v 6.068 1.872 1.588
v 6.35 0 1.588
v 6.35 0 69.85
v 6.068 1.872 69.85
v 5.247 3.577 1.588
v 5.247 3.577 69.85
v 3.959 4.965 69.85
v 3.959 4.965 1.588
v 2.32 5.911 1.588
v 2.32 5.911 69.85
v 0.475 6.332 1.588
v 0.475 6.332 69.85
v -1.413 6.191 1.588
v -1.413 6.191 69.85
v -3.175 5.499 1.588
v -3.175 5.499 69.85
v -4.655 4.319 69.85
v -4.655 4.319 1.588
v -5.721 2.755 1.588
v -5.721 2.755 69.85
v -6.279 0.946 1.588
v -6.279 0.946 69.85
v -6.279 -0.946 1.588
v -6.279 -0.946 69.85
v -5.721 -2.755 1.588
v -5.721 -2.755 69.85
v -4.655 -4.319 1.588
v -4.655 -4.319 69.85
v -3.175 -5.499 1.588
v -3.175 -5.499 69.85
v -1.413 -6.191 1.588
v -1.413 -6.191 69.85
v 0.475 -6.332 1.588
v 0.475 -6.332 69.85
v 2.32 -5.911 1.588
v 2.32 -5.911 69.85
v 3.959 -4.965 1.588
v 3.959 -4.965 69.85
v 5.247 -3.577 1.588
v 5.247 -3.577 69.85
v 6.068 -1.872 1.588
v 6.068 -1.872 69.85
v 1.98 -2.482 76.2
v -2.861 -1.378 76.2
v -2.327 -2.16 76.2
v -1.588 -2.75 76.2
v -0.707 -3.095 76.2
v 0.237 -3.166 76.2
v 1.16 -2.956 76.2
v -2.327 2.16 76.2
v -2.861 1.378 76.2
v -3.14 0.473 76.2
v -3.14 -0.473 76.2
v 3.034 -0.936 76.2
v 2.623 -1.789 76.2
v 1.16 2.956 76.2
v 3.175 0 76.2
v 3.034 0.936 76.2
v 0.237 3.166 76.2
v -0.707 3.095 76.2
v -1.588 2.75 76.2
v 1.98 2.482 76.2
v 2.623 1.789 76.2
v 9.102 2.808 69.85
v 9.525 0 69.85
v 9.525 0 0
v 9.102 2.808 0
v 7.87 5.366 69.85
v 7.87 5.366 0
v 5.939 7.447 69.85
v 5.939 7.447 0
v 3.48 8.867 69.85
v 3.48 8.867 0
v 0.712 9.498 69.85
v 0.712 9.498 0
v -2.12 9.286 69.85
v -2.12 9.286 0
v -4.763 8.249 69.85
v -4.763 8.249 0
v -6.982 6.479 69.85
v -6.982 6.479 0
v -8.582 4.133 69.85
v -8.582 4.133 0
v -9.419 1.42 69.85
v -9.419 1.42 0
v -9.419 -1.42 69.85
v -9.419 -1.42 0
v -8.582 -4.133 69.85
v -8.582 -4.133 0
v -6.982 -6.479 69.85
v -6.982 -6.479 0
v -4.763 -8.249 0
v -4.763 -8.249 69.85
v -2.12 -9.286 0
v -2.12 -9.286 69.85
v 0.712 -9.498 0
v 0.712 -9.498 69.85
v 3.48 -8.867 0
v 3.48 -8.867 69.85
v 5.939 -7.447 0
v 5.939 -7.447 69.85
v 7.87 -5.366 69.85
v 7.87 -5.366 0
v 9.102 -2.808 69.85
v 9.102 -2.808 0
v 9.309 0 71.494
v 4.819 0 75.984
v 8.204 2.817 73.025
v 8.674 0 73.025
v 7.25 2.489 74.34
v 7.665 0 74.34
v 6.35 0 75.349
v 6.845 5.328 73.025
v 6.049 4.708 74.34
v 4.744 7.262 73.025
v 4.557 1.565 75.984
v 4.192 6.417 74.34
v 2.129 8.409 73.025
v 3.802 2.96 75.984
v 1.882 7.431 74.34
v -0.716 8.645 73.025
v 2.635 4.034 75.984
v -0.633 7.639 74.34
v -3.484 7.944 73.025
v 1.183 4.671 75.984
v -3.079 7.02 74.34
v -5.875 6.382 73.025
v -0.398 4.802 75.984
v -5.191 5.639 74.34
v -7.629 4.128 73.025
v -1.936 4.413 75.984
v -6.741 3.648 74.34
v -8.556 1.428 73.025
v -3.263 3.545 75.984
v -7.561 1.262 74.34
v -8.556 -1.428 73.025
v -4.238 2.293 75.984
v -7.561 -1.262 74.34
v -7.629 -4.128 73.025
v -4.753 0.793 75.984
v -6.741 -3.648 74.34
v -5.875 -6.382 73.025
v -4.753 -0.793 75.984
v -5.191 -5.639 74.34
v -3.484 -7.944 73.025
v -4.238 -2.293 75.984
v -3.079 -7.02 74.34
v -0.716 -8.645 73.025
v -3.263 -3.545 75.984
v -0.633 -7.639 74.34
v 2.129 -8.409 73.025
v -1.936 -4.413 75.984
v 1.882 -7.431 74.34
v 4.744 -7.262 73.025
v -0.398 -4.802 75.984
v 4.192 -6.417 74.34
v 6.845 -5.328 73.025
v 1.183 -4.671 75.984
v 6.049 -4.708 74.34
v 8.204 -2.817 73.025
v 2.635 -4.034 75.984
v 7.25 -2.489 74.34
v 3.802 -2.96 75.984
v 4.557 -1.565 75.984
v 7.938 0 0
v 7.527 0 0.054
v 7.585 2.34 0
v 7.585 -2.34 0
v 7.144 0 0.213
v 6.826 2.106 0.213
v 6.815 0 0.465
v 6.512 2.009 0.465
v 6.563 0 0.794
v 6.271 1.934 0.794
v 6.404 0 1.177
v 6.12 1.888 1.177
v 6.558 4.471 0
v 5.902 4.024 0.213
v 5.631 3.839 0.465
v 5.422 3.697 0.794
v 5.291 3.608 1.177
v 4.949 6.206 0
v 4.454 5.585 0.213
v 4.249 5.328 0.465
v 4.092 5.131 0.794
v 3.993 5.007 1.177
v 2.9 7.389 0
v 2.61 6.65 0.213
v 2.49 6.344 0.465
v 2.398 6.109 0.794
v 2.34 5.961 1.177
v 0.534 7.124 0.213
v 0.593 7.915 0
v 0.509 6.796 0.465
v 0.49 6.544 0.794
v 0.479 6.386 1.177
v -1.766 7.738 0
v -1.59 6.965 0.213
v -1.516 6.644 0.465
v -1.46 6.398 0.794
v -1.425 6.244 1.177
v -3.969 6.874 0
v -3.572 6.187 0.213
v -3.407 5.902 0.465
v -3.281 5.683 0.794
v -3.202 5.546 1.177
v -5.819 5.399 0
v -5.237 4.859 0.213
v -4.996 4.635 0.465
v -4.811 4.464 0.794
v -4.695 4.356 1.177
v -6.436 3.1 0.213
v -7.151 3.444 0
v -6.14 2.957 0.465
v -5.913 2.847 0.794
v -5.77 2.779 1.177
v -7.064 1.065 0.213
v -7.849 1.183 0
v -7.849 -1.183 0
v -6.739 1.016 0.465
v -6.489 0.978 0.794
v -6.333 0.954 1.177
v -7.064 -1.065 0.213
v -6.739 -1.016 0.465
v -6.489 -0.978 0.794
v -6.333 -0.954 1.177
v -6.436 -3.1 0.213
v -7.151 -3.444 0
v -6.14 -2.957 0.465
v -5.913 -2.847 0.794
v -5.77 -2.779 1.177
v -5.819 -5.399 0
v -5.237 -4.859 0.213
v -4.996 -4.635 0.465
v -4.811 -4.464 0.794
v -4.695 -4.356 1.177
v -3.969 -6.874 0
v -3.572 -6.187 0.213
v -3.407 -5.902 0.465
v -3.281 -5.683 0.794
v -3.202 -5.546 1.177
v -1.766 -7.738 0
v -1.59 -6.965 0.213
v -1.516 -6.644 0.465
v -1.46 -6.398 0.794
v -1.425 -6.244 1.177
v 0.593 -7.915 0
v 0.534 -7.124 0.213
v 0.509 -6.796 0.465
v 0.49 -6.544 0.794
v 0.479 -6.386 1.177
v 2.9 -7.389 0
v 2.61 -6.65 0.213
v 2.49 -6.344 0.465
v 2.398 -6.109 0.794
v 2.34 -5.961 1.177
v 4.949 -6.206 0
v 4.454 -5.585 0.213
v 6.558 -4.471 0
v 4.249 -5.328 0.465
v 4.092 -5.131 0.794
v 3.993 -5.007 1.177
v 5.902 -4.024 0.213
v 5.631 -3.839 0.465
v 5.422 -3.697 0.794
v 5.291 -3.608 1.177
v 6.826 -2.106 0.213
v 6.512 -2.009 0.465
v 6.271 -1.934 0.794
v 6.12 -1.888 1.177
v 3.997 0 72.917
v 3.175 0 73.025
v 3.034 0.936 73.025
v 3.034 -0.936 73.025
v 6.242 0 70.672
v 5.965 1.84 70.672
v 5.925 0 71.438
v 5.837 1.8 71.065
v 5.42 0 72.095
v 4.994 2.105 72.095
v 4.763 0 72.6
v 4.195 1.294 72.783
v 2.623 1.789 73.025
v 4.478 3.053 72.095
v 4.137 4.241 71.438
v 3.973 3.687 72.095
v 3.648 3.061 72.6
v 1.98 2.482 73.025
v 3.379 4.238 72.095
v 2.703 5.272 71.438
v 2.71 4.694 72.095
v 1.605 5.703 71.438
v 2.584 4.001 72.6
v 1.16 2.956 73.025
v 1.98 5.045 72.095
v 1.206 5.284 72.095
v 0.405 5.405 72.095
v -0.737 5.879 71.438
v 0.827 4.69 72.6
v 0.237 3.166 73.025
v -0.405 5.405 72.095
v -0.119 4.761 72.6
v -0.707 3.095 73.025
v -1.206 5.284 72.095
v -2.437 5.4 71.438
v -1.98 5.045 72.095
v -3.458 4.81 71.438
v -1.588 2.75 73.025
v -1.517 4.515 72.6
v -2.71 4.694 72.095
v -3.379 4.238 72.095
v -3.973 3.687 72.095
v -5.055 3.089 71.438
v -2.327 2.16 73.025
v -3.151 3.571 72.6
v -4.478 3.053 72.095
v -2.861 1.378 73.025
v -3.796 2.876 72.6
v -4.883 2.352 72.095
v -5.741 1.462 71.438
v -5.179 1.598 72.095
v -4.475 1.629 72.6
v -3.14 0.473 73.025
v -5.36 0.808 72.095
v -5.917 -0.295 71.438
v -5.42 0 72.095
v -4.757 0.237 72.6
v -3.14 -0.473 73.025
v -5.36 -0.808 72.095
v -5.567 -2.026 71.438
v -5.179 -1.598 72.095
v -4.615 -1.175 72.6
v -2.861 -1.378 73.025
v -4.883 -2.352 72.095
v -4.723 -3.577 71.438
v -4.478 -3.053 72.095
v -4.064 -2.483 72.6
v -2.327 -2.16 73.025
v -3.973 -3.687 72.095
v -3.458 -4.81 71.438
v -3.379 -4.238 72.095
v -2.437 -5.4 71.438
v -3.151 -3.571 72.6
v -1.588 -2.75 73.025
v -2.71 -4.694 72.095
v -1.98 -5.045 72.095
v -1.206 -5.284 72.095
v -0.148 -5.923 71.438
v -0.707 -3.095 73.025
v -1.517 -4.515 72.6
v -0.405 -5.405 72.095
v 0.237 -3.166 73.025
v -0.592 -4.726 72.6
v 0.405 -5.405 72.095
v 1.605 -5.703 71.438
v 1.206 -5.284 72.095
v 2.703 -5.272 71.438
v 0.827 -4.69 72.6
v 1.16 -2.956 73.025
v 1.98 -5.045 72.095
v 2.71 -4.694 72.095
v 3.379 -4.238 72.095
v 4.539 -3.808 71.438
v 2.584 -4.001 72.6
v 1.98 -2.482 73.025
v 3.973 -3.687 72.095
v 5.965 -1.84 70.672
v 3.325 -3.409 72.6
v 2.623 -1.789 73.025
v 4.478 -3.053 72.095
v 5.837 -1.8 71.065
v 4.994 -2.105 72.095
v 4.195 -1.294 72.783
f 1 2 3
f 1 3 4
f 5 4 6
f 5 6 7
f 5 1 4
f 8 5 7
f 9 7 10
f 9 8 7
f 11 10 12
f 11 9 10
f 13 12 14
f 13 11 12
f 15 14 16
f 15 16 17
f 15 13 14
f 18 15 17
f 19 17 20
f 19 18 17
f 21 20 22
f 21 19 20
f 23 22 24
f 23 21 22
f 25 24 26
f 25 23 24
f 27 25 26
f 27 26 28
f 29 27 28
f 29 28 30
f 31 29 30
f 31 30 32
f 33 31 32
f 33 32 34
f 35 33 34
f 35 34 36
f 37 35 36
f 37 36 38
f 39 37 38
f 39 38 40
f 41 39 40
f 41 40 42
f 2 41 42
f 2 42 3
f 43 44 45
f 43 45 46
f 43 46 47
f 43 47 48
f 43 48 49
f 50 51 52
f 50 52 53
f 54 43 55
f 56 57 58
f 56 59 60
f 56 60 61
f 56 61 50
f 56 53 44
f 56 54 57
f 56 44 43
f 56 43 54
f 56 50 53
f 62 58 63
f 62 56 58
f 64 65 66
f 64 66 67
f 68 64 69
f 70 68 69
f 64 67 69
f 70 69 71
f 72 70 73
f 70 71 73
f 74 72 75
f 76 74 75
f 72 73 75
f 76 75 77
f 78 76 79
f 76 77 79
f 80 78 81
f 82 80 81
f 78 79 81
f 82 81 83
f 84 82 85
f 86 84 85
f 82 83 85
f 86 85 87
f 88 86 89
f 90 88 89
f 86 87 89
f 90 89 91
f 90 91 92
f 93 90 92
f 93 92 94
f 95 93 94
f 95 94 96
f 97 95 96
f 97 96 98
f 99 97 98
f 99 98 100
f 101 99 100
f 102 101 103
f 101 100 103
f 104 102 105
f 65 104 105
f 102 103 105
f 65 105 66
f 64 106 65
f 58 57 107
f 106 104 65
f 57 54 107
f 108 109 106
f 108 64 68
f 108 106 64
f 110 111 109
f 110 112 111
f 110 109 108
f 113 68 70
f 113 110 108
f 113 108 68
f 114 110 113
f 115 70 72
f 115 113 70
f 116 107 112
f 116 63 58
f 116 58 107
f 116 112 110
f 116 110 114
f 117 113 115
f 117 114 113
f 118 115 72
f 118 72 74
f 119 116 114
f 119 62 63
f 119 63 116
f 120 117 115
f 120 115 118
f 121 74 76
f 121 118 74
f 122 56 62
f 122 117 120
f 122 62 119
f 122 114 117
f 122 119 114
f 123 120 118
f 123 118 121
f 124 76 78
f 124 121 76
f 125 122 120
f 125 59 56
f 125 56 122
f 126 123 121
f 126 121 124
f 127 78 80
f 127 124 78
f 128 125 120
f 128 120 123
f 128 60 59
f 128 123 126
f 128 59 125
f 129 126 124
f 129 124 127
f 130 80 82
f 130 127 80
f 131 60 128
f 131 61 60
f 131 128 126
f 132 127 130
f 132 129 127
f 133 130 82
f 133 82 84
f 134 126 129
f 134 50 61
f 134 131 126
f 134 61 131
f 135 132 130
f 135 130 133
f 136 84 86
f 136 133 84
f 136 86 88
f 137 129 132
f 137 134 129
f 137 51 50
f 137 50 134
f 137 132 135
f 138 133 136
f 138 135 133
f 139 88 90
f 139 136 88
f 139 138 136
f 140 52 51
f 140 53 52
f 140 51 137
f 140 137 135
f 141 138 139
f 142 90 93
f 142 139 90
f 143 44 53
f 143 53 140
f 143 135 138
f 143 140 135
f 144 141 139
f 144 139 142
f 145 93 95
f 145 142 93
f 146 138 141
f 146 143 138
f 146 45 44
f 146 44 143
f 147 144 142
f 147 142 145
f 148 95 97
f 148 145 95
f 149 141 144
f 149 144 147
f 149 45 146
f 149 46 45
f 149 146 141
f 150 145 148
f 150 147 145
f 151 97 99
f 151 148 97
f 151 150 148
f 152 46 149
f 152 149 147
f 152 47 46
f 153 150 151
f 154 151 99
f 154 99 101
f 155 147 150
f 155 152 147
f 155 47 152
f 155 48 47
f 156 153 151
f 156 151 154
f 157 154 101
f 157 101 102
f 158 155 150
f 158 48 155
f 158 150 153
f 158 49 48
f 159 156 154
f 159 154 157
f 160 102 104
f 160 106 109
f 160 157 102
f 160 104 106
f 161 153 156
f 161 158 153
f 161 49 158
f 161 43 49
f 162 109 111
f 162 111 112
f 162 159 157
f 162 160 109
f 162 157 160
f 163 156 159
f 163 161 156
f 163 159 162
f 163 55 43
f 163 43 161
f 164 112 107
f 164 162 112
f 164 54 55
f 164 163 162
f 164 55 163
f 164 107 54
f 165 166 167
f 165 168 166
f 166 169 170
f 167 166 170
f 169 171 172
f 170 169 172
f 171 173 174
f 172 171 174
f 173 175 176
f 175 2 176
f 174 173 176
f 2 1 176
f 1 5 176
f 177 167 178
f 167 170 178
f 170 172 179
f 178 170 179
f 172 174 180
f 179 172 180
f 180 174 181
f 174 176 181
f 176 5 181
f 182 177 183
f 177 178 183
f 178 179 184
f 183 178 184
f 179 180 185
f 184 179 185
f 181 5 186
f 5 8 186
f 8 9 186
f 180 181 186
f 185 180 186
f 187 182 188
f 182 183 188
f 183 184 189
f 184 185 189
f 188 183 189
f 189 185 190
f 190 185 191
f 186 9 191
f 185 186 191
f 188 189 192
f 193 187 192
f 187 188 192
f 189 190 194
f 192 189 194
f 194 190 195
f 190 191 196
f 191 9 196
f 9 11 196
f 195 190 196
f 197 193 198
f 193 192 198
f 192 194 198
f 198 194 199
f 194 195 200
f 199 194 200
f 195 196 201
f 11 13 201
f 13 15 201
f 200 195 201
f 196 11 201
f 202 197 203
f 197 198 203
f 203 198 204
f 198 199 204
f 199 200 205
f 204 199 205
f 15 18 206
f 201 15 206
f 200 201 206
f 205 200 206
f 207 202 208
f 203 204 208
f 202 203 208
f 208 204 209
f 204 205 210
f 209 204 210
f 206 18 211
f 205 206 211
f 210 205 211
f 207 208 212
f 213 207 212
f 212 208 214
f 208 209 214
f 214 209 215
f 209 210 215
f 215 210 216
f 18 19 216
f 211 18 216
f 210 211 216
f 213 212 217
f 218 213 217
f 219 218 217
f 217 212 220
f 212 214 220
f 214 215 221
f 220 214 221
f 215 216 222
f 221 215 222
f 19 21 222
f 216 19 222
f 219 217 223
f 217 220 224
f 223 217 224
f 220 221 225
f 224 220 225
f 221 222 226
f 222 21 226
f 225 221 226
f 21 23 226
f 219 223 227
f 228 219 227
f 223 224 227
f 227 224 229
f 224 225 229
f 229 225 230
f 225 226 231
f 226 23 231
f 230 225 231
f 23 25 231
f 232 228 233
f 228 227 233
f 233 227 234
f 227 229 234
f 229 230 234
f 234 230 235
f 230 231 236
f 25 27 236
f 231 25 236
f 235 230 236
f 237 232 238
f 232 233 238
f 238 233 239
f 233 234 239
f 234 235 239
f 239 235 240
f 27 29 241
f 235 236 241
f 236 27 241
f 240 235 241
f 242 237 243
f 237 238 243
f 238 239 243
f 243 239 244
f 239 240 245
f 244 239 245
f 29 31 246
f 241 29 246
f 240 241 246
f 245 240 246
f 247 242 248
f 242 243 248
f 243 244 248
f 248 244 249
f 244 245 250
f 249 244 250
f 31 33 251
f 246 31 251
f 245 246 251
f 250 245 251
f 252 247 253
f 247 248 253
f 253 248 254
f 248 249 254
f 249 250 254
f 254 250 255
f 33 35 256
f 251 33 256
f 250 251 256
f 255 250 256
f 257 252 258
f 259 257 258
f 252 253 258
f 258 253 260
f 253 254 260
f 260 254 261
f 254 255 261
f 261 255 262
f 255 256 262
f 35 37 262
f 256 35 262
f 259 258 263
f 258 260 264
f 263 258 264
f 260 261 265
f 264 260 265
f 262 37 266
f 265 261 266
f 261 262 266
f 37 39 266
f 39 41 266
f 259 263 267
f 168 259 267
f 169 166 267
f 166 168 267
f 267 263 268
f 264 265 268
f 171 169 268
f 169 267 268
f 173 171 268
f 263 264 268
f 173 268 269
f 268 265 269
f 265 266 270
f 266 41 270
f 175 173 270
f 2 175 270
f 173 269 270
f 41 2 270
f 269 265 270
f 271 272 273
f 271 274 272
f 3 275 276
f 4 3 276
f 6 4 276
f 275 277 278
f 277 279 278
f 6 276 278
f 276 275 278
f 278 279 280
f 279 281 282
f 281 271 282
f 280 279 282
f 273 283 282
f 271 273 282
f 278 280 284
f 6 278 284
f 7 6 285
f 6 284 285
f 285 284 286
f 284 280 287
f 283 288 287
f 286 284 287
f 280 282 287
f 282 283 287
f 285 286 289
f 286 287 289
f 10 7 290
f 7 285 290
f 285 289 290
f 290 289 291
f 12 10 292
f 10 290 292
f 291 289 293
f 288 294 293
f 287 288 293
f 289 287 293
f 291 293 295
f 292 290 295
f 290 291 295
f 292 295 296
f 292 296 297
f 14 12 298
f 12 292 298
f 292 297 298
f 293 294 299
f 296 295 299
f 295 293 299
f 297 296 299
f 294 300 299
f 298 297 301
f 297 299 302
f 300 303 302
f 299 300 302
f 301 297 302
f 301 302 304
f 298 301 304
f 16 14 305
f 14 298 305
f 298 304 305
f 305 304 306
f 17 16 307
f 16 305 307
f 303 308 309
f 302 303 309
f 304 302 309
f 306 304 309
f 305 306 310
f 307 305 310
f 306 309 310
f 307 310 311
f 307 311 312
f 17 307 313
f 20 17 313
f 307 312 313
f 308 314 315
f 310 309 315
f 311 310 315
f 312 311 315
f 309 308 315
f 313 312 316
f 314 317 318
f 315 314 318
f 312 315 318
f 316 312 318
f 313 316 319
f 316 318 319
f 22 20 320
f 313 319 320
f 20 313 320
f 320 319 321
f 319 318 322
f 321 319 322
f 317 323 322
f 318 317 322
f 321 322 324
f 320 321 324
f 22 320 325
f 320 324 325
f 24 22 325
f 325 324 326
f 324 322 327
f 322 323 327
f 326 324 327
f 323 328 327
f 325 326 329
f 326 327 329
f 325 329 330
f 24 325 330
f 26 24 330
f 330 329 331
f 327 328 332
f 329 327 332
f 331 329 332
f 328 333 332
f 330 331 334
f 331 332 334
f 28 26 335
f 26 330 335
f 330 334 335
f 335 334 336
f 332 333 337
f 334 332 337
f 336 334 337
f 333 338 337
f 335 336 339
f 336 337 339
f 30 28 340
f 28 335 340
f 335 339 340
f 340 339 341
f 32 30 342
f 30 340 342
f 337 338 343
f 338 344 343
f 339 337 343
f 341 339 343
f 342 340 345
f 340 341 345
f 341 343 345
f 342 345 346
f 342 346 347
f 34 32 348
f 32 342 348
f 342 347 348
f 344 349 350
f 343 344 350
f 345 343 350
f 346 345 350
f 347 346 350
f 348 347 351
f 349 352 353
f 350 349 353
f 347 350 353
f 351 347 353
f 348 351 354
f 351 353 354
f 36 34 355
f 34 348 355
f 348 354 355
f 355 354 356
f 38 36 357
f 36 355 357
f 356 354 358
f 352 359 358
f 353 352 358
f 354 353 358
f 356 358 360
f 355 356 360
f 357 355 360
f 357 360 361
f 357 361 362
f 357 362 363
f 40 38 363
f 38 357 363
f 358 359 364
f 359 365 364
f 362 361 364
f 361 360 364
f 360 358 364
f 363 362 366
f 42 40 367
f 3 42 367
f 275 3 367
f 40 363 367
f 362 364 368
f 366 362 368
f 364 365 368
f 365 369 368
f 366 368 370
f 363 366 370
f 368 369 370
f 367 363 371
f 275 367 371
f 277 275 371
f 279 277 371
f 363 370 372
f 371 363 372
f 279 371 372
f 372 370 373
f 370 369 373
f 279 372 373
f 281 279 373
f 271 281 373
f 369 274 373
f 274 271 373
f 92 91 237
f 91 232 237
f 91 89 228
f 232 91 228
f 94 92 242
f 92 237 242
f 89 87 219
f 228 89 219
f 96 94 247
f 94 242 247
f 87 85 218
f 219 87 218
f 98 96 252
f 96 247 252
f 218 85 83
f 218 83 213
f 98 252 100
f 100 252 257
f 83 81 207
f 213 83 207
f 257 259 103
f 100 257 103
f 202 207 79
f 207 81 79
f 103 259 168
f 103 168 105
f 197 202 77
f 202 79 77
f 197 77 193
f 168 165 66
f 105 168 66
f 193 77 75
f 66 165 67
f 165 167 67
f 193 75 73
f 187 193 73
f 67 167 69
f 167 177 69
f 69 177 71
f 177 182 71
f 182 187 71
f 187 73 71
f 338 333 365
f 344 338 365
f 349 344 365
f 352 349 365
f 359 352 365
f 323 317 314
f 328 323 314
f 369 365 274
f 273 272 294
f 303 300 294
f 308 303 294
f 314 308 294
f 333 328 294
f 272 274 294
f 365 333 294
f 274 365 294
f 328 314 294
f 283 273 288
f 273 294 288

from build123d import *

# Parameters (mm, degrees)
F0_R     = 9.525
F1_DEPTH = 76.2
F2_R     = 6.35
F3_T     = -3.175
F4_R     = 1.5875


with BuildPart() as f1:
    # F0 (on Top) → F1 (new body)
    with BuildSketch(Plane.XY):
        Circle(F0_R)
    extrude(amount=F1_DEPTH)

    # F2
    f2_edges = [f1.edges().sort_by_distance(p)[0] for p in [
        (-9.525, 0, 76.2),
    ]]
    fillet(f2_edges, radius=F2_R)

    # F3
    f3_openings = [f1.faces().sort_by_distance(p)[0] for p in [
        (0, 0, 0),
    ]]
    offset(amount=F3_T, openings=f3_openings)

    # F4
    f4_edges = [f1.edges().sort_by_distance(p)[0] for p in [
        (-6.35, 0, 0),
    ]]
    fillet(f4_edges, radius=F4_R)


solid = f1.part
